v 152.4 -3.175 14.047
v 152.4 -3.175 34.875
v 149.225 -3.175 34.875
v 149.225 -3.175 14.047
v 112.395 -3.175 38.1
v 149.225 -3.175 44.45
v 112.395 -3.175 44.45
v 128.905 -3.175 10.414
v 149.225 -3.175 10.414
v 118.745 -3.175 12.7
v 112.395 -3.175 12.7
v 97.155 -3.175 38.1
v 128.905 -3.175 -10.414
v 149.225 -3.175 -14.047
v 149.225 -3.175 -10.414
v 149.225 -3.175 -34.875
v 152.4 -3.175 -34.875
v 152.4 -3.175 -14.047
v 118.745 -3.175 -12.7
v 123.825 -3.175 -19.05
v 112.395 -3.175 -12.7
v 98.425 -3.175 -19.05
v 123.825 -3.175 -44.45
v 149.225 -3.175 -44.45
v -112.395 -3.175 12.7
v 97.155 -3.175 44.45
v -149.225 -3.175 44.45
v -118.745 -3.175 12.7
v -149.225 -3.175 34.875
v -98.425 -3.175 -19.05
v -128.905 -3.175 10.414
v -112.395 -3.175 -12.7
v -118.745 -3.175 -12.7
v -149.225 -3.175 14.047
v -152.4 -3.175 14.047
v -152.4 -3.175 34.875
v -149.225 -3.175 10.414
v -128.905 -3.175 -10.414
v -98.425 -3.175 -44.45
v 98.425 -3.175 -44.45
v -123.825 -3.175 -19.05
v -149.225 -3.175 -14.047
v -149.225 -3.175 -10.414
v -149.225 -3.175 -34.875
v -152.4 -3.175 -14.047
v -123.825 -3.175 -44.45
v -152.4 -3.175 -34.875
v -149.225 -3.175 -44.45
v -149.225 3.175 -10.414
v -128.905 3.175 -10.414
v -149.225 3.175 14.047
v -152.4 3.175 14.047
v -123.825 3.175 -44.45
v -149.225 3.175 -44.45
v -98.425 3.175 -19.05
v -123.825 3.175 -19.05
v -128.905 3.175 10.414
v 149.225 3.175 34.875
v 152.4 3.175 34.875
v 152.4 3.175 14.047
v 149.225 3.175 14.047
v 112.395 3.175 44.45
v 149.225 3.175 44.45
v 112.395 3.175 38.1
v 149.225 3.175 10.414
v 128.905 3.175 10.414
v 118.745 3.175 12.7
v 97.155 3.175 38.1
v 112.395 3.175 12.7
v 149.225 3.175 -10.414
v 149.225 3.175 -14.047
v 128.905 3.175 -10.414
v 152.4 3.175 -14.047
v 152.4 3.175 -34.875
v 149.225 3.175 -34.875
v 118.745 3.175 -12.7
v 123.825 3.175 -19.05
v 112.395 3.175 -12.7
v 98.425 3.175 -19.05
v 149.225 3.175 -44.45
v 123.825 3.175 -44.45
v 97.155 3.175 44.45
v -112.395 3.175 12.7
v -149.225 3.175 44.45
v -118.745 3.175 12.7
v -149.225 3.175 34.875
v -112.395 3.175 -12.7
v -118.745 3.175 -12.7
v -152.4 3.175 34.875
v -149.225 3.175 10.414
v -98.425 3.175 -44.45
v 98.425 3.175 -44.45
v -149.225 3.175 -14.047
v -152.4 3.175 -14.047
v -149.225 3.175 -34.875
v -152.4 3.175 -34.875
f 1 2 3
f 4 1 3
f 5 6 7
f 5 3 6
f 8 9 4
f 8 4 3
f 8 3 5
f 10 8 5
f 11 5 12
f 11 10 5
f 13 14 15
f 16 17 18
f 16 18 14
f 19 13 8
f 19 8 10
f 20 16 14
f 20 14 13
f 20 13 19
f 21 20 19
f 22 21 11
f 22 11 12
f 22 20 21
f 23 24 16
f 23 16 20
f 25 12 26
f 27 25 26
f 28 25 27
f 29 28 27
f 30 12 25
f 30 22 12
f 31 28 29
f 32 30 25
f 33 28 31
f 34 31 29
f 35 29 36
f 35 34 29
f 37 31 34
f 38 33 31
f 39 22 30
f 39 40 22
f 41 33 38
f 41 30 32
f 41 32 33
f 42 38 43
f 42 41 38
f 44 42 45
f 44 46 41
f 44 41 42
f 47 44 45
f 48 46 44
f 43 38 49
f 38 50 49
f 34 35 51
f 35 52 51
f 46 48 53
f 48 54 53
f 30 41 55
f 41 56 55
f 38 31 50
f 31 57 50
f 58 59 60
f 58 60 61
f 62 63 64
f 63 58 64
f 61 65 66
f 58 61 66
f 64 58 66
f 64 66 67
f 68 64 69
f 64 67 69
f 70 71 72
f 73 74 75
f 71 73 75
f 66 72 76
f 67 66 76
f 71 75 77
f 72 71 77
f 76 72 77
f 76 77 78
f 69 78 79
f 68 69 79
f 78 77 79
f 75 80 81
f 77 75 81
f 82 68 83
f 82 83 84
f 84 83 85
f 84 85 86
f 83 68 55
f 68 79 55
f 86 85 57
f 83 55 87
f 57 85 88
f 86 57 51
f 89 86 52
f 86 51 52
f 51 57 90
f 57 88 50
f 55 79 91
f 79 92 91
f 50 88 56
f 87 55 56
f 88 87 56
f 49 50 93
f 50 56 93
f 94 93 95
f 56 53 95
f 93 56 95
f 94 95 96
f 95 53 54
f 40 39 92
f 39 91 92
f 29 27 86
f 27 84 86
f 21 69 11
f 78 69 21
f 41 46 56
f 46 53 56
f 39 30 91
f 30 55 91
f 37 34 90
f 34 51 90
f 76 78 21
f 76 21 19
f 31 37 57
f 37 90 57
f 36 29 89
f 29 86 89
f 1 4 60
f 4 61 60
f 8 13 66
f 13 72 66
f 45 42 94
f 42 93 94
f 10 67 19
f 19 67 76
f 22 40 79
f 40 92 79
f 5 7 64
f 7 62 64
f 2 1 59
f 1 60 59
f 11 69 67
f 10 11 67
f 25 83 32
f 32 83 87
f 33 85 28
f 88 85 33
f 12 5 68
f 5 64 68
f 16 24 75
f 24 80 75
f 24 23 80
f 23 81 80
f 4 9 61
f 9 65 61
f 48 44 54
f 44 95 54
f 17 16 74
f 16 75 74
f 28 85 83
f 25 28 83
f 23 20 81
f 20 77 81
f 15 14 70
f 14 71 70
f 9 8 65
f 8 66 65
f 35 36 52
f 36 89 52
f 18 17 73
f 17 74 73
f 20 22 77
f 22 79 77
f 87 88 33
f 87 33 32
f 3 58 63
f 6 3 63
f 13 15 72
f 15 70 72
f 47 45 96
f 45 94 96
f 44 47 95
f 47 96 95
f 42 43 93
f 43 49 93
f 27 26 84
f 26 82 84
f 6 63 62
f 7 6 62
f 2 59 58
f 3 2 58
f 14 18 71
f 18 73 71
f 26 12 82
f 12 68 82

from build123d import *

# Parameters (mm, degrees)
BOSS_EXTRUDE1_DEPTH     = 3.175
SKETCH2_W               = 6.35
SKETCH2_H               = 25.4
CUT_EXTRUDE1_DEPTH      = 4.175
CUT_EXTRUDE1_DEPTH_BACK = 4.175


with BuildPart() as part:
    # Sketch1 → Boss-Extrude1 (new body, symmetric)
    with BuildSketch(Plane(origin=(0, 0, 0), x_dir=(1, 0, 0), z_dir=(0, 1, 0))):
        Polygon((149.225, -44.45), (112.395, -44.45), (112.395, -38.1), (97.155, -38.1), (97.155, -44.45), (-149.225, -44.45), (-149.225, -34.874677354), (-152.4, -34.874677354), (-152.4, -14.046677354), (-149.225, -14.046677354), (-149.225, -10.414), (-128.905, -10.414), (-128.905, 10.414), (-149.225, 10.414), (-149.225, 14.046677354), (-152.4, 14.046677354), (-152.4, 34.874677354), (-149.225, 34.874677354), (-149.225, 44.45), (-123.825, 44.45), (-123.825, 19.05), (-98.425, 19.05), (-98.425, 44.45), (98.425, 44.45), (98.425, 19.05), (123.825, 19.05), (123.825, 44.45), (149.225, 44.45), (149.225, 34.874677354), (152.4, 34.874677354), (152.4, 14.046677354), (149.225, 14.046677354), (149.225, 10.414), (128.905, 10.414), (128.905, -10.414), (149.225, -10.414), (149.225, -14.046677354), (152.4, -14.046677354), (152.4, -34.874677354), (149.225, -34.874677354), align=None)
    extrude(amount=BOSS_EXTRUDE1_DEPTH, both=True)

    # Sketch2 → Cut-Extrude1 (cut, two sides)
    with BuildSketch(Plane(origin=(0, 0, 0), x_dir=(1, 0, 0), z_dir=(0, 1, 0))) as cut_extrude1_sk:
        with Locations((115.57, 0)):
            Rectangle(SKETCH2_W, SKETCH2_H)
        with Locations((-115.57, 0)):
            Rectangle(SKETCH2_W, SKETCH2_H)
    extrude(amount=CUT_EXTRUDE1_DEPTH, mode=Mode.SUBTRACT)
    extrude(cut_extrude1_sk.sketch, amount=-CUT_EXTRUDE1_DEPTH_BACK, mode=Mode.SUBTRACT)


solid = part.part
